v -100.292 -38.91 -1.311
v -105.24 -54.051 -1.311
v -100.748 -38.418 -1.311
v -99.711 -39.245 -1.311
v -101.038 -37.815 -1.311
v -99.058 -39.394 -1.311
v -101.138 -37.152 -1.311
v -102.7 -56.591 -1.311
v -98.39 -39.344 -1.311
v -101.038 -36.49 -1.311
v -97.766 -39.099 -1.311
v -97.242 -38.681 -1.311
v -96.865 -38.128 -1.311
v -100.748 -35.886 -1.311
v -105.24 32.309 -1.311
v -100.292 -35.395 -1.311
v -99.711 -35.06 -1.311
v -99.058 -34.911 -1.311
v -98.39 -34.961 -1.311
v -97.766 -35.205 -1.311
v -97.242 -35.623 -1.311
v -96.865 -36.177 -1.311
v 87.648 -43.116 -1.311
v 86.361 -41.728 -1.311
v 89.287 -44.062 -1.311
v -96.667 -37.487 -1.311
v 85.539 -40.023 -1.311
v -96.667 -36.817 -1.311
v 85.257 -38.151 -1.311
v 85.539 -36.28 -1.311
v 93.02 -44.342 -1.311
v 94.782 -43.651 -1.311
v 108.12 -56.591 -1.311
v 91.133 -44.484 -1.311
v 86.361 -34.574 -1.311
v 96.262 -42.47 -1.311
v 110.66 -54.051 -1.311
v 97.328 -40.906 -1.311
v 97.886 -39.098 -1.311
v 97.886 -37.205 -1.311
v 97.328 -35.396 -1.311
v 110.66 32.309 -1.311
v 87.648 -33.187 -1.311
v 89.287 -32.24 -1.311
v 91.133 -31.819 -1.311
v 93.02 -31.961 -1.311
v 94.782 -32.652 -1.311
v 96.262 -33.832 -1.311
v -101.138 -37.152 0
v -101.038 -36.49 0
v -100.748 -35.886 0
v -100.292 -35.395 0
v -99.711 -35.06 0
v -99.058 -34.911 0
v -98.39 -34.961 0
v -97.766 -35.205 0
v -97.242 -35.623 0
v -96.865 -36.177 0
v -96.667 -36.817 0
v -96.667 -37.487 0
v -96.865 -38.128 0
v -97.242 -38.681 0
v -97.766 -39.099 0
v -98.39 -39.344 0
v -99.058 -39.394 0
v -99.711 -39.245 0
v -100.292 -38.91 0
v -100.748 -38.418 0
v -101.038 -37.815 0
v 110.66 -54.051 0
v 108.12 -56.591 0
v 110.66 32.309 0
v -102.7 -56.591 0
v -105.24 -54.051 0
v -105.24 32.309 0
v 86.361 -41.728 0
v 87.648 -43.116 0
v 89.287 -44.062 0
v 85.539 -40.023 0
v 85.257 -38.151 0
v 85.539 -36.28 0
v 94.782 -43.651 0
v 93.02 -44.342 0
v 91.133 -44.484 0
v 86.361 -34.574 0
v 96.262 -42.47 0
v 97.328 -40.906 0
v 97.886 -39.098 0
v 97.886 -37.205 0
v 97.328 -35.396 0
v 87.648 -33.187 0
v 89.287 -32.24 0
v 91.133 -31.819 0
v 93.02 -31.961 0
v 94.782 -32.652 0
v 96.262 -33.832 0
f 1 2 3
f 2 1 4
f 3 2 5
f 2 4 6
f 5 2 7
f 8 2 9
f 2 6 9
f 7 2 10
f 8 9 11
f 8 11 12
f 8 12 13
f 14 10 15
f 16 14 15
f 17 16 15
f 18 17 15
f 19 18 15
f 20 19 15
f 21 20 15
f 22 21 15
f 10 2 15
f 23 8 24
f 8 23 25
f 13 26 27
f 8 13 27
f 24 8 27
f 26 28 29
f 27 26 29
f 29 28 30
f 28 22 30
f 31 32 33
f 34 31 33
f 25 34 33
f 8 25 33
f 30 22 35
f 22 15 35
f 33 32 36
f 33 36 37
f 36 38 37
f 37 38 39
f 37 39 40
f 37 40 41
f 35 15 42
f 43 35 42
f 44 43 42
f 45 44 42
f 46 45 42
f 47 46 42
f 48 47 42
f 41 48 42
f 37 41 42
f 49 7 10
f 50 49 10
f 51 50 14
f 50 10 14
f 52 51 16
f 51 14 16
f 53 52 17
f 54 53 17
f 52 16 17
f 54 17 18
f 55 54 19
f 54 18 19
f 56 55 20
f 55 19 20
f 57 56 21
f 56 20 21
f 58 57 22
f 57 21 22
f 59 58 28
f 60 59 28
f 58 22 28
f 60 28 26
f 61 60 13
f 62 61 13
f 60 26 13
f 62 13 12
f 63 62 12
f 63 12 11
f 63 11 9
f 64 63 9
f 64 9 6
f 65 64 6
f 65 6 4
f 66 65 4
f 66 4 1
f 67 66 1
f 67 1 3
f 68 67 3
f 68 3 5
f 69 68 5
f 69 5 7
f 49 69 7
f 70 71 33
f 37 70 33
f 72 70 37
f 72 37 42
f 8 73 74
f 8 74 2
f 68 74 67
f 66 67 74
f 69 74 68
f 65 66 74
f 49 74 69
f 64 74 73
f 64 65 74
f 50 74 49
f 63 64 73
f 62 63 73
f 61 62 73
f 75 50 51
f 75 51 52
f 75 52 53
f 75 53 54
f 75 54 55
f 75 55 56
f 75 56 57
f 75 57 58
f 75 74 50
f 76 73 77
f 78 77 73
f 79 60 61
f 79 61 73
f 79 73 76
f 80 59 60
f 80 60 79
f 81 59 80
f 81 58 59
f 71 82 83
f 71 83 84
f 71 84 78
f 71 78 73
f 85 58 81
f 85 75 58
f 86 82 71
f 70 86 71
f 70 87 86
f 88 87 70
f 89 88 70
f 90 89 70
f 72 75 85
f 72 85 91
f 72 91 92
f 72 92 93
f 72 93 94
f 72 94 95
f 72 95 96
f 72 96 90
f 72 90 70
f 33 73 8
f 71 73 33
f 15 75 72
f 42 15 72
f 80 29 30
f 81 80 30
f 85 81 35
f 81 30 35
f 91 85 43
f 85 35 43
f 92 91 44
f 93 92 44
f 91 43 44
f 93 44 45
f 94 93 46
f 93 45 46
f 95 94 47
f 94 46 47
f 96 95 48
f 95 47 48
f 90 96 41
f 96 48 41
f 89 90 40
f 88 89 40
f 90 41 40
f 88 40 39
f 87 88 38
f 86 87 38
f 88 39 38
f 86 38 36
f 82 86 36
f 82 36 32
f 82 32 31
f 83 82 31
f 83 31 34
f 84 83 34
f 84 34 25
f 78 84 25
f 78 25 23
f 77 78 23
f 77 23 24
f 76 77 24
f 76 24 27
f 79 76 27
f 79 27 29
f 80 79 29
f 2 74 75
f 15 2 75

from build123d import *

# Parameters (mm, degrees)
F0_W     = 215.9
F0_H     = 88.9
F1_DEPTH = 1.31064
F2_SIZE  = 2.54
F3_SIZE  = 2.54
F5_D     = 4.4958
F6_D     = 12.7


with BuildPart() as f1:
    # F0 (on Top) → F1 (new body)
    with BuildSketch(Plane.XY):
        with Locations((2.709784, -12.140669)):
            Rectangle(F0_W, F0_H)
    extrude(amount=-F1_DEPTH)

    # F2
    f2_edges = [f1.edges().sort_by_distance(p)[0] for p in [
        (-105.240216, -56.590669, -0.65532),
    ]]
    chamfer(f2_edges, length=F2_SIZE)

    # F3
    f3_edges = [f1.edges().sort_by_distance(p)[0] for p in [
        (110.659784, -56.590669, -0.65532),
    ]]
    chamfer(f3_edges, length=F3_SIZE)

    # F5 (through all)
    with Locations(Plane.XY):
        with Locations((-98.890216, -37.152206)):
            Hole(F5_D / 2)

    # F6 (through all)
    with Locations(Plane.XY):
        with Locations((91.607164, -38.151322)):
            Hole(F6_D / 2)


solid = f1.part
